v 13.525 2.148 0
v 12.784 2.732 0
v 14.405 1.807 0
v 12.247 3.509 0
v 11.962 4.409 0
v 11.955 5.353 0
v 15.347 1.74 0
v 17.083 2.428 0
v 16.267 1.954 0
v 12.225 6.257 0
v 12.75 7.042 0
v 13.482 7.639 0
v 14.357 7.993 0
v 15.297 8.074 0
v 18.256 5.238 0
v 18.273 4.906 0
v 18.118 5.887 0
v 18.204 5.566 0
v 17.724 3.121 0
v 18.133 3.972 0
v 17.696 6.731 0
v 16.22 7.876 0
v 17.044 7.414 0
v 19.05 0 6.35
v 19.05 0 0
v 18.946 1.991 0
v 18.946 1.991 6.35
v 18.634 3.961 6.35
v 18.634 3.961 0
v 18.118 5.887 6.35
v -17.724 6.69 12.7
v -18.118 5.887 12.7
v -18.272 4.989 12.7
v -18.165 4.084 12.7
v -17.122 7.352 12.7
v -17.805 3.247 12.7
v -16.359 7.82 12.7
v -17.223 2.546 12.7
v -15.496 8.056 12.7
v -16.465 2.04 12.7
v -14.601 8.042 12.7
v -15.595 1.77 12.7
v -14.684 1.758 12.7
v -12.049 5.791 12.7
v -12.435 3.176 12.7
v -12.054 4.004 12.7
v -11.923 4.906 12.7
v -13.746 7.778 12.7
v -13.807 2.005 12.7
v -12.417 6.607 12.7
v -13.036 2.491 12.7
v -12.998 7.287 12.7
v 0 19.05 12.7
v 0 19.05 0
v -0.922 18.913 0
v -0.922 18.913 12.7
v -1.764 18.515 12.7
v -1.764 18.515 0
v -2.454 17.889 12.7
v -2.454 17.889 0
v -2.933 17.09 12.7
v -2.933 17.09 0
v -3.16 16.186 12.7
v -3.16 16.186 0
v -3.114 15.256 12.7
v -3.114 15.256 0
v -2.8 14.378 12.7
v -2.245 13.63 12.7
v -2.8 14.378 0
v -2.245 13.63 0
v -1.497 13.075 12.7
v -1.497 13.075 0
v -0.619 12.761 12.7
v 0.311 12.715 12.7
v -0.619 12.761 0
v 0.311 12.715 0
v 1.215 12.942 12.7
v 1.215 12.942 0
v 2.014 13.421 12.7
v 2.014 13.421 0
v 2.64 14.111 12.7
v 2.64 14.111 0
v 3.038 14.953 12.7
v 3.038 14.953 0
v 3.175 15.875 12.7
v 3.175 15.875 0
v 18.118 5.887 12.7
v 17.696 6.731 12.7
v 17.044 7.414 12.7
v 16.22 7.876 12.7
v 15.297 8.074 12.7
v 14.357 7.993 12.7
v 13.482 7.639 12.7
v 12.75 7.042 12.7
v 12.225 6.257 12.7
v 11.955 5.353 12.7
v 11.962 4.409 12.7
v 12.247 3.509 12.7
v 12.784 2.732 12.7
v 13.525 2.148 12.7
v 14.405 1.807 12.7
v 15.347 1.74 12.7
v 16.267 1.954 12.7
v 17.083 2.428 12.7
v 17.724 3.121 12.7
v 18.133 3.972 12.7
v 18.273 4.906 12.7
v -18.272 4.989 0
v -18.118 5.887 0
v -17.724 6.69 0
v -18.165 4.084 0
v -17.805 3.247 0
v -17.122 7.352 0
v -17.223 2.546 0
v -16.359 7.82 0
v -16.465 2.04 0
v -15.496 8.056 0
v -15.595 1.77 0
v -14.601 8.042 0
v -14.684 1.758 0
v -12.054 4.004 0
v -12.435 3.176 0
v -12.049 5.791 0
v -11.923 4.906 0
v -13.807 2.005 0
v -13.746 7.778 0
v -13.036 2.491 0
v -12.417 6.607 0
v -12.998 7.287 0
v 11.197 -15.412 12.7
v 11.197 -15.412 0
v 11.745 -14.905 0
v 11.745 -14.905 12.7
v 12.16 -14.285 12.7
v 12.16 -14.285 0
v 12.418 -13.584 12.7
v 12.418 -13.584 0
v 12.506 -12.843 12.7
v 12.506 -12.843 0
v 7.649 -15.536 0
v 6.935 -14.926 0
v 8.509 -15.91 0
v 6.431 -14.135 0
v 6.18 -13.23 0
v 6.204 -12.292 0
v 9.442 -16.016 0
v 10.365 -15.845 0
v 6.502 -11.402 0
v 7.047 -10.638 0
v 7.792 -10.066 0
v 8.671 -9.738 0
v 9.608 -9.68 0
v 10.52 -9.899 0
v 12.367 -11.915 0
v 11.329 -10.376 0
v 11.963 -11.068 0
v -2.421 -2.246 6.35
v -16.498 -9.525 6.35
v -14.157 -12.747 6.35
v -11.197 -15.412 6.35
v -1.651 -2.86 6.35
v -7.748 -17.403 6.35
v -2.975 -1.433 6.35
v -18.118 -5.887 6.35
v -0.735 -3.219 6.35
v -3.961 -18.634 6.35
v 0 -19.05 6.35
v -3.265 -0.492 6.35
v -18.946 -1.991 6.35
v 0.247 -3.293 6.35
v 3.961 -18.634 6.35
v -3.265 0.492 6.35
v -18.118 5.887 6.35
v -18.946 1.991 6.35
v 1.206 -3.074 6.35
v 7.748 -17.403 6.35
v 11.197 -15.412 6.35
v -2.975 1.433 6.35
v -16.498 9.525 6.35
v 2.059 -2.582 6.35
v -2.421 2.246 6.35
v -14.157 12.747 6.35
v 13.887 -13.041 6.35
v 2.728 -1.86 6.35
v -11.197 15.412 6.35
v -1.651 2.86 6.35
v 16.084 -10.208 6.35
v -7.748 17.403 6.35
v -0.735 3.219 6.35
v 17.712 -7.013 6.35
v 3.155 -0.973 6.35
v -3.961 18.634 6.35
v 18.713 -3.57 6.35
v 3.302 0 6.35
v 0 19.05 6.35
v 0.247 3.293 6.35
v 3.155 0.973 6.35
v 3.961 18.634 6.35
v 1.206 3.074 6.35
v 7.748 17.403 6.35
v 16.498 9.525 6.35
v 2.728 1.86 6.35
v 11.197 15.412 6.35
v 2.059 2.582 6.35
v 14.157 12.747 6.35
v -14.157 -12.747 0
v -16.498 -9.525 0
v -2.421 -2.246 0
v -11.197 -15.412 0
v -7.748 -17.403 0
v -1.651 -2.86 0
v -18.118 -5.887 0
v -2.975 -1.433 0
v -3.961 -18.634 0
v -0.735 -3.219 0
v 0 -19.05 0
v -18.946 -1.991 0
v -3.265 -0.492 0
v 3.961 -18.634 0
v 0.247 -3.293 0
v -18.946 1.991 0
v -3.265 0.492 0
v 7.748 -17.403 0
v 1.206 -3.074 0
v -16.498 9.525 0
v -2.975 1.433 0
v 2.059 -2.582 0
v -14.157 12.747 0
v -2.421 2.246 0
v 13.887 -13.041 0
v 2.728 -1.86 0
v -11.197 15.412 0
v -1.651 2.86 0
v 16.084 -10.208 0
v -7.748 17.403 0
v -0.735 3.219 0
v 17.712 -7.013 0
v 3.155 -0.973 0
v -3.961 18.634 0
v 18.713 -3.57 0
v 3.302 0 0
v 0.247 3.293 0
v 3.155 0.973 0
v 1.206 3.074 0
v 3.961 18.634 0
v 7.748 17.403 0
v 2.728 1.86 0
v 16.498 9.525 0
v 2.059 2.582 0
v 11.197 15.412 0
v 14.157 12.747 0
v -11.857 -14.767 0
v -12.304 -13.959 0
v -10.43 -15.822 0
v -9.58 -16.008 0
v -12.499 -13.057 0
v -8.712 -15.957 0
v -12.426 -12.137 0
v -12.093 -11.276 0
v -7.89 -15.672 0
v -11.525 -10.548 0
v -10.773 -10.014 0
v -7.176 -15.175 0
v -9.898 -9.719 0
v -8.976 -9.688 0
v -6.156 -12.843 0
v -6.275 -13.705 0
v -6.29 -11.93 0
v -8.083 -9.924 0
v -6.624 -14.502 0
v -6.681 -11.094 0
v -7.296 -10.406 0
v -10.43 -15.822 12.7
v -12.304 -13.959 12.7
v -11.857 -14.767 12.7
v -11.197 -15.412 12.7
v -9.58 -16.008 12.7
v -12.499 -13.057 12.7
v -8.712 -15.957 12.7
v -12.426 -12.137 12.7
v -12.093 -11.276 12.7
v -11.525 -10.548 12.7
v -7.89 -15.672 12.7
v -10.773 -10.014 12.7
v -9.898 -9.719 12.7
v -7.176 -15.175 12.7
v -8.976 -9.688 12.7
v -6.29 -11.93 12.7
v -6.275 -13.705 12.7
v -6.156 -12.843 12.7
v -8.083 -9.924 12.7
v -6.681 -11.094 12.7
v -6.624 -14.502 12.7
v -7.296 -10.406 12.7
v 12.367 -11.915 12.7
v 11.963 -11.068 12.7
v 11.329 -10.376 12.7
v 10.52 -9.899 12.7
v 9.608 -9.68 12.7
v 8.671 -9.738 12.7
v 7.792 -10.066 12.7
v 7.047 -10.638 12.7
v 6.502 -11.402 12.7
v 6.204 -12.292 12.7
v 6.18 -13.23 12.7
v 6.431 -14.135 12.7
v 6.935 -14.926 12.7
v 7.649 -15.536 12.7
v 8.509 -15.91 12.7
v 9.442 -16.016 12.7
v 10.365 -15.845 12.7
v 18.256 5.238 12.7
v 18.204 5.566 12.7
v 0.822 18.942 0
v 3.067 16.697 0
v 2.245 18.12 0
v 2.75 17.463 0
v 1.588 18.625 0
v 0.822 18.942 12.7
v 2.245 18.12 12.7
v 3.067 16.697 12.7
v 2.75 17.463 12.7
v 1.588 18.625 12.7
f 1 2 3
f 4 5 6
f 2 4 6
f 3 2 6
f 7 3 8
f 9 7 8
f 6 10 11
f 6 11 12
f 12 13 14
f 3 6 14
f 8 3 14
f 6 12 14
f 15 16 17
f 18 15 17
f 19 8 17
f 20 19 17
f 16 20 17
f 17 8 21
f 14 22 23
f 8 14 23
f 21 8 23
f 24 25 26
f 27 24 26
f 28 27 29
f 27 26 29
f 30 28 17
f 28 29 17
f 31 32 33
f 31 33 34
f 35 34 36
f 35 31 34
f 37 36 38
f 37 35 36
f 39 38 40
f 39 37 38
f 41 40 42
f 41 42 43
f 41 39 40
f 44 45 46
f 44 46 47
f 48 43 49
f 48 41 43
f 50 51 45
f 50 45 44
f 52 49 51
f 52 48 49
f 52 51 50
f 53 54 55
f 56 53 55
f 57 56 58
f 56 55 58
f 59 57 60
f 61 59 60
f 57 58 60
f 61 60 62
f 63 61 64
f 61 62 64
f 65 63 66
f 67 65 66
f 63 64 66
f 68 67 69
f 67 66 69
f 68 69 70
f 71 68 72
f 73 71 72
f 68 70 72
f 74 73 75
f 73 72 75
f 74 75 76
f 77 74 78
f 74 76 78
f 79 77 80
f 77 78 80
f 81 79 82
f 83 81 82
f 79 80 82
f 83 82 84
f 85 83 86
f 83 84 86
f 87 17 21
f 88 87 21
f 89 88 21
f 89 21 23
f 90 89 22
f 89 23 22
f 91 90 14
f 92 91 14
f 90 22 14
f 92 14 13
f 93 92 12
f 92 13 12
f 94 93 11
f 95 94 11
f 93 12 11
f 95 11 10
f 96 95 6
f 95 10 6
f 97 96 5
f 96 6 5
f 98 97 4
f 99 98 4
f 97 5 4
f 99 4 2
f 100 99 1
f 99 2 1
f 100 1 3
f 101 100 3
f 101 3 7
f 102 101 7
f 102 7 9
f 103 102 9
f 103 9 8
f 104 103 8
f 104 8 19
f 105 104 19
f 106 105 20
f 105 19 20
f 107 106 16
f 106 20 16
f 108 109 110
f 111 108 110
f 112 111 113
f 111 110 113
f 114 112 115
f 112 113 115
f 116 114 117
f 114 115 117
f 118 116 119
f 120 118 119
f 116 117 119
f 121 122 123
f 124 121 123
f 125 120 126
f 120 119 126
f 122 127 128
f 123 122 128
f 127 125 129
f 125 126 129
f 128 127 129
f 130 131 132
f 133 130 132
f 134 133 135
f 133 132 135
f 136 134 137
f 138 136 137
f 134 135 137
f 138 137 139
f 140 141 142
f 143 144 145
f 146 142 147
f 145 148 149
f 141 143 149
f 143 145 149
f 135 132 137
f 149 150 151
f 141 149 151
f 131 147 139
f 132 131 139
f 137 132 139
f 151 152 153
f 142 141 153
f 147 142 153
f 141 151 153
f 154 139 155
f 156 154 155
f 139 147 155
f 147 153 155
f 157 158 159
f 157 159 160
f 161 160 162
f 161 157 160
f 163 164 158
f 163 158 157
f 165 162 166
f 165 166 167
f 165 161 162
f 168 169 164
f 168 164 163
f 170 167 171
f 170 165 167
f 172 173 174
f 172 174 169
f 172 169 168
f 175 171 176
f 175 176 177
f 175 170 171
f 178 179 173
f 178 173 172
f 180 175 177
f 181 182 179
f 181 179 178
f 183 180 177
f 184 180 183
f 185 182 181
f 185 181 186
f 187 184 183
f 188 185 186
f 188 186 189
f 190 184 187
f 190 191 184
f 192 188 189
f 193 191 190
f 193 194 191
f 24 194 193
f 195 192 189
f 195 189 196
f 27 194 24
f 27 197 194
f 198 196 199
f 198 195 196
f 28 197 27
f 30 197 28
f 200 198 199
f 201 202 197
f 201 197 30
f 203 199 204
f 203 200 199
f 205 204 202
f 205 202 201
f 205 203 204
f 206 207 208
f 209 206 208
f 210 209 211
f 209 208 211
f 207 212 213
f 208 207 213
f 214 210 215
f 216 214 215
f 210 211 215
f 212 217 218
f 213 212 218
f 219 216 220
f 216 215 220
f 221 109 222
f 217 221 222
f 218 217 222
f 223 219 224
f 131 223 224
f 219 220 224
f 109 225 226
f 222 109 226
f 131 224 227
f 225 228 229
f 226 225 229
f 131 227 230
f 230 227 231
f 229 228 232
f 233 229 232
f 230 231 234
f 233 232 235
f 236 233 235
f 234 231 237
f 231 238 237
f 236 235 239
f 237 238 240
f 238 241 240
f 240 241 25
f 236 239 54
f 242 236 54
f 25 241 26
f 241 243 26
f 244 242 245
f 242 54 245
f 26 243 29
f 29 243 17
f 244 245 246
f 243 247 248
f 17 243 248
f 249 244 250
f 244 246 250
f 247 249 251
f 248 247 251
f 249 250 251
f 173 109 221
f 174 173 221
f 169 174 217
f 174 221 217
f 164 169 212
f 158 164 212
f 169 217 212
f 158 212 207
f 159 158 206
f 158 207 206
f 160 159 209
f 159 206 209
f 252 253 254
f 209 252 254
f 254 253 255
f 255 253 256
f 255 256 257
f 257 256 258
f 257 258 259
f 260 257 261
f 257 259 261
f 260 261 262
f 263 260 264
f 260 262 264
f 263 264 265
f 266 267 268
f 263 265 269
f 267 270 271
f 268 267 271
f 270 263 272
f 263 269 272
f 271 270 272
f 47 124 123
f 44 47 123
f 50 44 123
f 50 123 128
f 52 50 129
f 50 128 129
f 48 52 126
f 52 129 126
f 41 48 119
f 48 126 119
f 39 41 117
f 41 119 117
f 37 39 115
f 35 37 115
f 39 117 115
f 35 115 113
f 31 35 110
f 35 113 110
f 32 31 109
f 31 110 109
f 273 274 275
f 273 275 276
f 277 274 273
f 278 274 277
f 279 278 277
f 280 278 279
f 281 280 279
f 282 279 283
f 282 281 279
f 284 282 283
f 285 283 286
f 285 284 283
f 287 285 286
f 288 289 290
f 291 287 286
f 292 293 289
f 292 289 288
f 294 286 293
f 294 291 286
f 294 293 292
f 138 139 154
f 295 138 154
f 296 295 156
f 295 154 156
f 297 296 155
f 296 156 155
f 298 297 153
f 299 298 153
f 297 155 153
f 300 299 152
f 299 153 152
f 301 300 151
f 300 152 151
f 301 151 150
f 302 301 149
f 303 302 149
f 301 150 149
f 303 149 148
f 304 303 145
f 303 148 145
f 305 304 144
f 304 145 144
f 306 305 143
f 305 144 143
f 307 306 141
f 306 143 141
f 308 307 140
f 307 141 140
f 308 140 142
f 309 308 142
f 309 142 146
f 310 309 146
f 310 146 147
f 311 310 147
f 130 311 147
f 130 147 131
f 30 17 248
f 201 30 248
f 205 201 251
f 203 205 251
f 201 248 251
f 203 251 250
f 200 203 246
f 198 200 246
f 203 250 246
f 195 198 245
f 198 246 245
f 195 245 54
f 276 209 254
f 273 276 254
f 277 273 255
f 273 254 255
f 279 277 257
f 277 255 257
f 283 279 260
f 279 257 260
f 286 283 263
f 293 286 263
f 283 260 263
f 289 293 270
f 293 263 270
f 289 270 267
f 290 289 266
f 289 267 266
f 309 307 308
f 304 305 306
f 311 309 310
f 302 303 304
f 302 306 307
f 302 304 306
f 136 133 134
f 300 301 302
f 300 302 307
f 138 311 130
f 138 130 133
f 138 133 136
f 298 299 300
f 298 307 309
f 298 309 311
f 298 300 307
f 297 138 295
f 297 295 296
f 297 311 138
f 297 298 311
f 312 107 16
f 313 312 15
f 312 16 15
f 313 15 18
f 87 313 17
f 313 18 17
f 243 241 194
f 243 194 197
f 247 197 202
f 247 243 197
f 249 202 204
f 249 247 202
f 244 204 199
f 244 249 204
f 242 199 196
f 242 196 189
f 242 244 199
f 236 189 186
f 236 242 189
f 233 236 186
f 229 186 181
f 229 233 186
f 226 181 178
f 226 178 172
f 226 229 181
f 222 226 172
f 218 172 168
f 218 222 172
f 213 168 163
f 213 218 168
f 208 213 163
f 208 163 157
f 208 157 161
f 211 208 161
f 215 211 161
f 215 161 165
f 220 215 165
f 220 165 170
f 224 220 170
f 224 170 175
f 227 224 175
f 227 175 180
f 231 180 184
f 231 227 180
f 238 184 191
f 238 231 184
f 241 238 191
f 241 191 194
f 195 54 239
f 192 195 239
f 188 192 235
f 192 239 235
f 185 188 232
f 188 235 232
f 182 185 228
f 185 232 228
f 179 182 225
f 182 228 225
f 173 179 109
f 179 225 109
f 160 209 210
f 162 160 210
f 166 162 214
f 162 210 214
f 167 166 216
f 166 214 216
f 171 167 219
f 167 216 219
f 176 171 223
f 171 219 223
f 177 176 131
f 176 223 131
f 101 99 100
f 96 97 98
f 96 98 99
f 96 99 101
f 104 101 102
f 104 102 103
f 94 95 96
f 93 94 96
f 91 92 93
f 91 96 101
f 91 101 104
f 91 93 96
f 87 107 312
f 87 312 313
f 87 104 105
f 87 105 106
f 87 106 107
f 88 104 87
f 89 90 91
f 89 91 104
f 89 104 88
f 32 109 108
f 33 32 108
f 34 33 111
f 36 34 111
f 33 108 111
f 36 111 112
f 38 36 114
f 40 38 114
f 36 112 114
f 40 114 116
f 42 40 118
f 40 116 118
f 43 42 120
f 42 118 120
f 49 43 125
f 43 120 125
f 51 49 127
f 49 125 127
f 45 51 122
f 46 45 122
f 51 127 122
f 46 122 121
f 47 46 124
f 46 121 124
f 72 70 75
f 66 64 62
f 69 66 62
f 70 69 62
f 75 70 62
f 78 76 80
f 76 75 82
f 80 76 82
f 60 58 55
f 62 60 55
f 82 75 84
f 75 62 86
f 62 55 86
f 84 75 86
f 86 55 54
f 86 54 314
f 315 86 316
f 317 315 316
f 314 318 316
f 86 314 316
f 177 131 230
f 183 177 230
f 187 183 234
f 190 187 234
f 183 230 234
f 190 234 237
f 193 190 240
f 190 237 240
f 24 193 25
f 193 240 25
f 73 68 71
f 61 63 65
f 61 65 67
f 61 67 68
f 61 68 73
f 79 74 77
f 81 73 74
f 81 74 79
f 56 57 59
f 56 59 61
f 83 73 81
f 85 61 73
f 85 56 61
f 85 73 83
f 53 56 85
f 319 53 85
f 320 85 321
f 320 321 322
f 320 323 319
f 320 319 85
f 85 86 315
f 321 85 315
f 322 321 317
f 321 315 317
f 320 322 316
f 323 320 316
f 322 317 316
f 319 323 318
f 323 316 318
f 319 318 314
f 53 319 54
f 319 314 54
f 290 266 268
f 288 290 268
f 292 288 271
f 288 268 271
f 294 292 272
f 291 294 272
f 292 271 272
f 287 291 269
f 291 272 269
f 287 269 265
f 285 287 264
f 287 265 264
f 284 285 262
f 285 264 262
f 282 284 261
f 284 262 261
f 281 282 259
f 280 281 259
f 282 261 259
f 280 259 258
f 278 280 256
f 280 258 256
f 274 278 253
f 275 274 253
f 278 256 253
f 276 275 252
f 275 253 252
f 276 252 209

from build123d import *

# Parameters (mm, degrees)
F0_R     = 3.302
F1_DEPTH = 6.35
F2_DEPTH = 12.7
F3_DEPTH = 12.7


with BuildPart() as f1:
    # F0 (on Top) → F1 (new body)
    with BuildSketch(Plane.XY):
        with BuildLine():
            ThreePointArc((11.19730897, -15.4117738054), (16.9736742616, -8.6485190675), (19.05, 0))
            ThreePointArc((19.05, 0), (18.8154628823, 2.980076597), (18.1176266116, 5.8867738161))
            ThreePointArc((18.1176266116, 5.8867738161), (11.197309025, 15.4117737655), (0, 19.05))
            ThreePointArc((0, 19.05), (-11.1973090383, 15.4117737558), (-18.1176266218, 5.8867737848))
            ThreePointArc((-18.1176266218, 5.8867737848), (-18.1176266522, -5.8867736914), (-11.1973091081, -15.4117737051))
            ThreePointArc((-11.1973091081, -15.4117737051), (-8.53e-08, -19.05), (11.19730897, -15.4117738054))
        make_face()
        with BuildLine():
            ThreePointArc((-6.1560908801, -12.8431447857), (-7.8896710721, -15.6720905146), (-11.1973091081, -15.4117737051))
            ThreePointArc((-11.1973091081, -15.4117737051), (-10.7725106882, -10.0141990568), (-6.1560908801, -12.8431447857))
        make_face(mode=Mode.SUBTRACT)
        with BuildLine():
            ThreePointArc((12.5060908801, -12.8431447857), (12.1600365703, -14.2845646698), (11.19730897, -15.4117738054))
            ThreePointArc((11.19730897, -15.4117738054), (6.50214519, -11.4017249016), (12.5060908801, -12.8431447857))
        make_face(mode=Mode.SUBTRACT)
        with BuildLine():
            ThreePointArc((-11.9230221962, 4.9056447857), (-15.5947016445, 1.7697343078), (-18.1176266218, 5.8867737848))
            ThreePointArc((-18.1176266218, 5.8867737848), (-14.6013427479, 8.0415552636), (-11.9230221962, 4.9056447857))
        make_face(mode=Mode.SUBTRACT)
        Circle(F0_R, mode=Mode.SUBTRACT)
        with BuildLine():
            ThreePointArc((18.2730221962, 4.9056447857), (11.9621117208, 4.4089653212), (18.1176266116, 5.8867738161))
            ThreePointArc((18.1176266116, 5.8867738161), (18.2339326716, 5.4023242502), (18.2730221962, 4.9056447857))
        make_face(mode=Mode.SUBTRACT)
        with BuildLine():
            ThreePointArc((3.175, 15.875), (-2.2450640303, 13.6299359697), (0, 19.05))
            ThreePointArc((0, 19.05), (2.2450640303, 18.1200640303), (3.175, 15.875))
        make_face(mode=Mode.SUBTRACT)
        with BuildLine():
            ThreePointArc((18.2730221962, 4.9056447857), (18.2339326716, 5.4023242502), (18.1176266116, 5.8867738161))
            ThreePointArc((18.1176266116, 5.8867738161), (11.9621117208, 4.4089653212), (18.2730221962, 4.9056447857))
        make_face()
        with BuildLine():
            ThreePointArc((3.175, 15.875), (2.2450640303, 18.1200640303), (0, 19.05))
            ThreePointArc((0, 19.05), (-2.2450640303, 13.6299359697), (3.175, 15.875))
        make_face()
        with BuildLine():
            ThreePointArc((-11.9230221962, 4.9056447857), (-14.6013427479, 8.0415552636), (-18.1176266218, 5.8867737848))
            ThreePointArc((-18.1176266218, 5.8867737848), (-15.5947016445, 1.7697343078), (-11.9230221962, 4.9056447857))
        make_face()
        with BuildLine():
            ThreePointArc((-6.1560908801, -12.8431447857), (-10.7725106882, -10.0141990568), (-11.1973091081, -15.4117737051))
            ThreePointArc((-11.1973091081, -15.4117737051), (-7.8896710721, -15.6720905146), (-6.1560908801, -12.8431447857))
        make_face()
        with BuildLine():
            ThreePointArc((12.5060908801, -12.8431447857), (6.50214519, -11.4017249016), (11.19730897, -15.4117738054))
            ThreePointArc((11.19730897, -15.4117738054), (12.1600365703, -14.2845646698), (12.5060908801, -12.8431447857))
        make_face()
    extrude(amount=F1_DEPTH)


with BuildPart() as f2:
    # F0 (on Top) → F2 (new body)
    with BuildSketch(Plane.XY):
        with BuildLine():
            ThreePointArc((3.175, 15.875), (2.2450640303, 18.1200640303), (0, 19.05))
            ThreePointArc((0, 19.05), (-2.2450640303, 13.6299359697), (3.175, 15.875))
        make_face()
    extrude(amount=F2_DEPTH)


with BuildPart() as f2b:
    # F0 (on Top) → F2, piece 2 (new body)
    with BuildSketch(Plane.XY):
        with BuildLine():
            ThreePointArc((-6.1560908801, -12.8431447857), (-10.7725106882, -10.0141990568), (-11.1973091081, -15.4117737051))
            ThreePointArc((-11.1973091081, -15.4117737051), (-7.8896710721, -15.6720905146), (-6.1560908801, -12.8431447857))
        make_face()
    extrude(amount=F2_DEPTH)


with BuildPart() as f2c:
    # F0 (on Top) → F2, piece 3 (new body)
    with BuildSketch(Plane.XY):
        with BuildLine():
            ThreePointArc((12.5060908801, -12.8431447857), (6.50214519, -11.4017249016), (11.19730897, -15.4117738054))
            ThreePointArc((11.19730897, -15.4117738054), (12.1600365703, -14.2845646698), (12.5060908801, -12.8431447857))
        make_face()
    extrude(amount=F2_DEPTH)


with BuildPart() as f2d:
    # F0 (on Top) → F2, piece 4 (new body)
    with BuildSketch(Plane.XY):
        with BuildLine():
            ThreePointArc((18.2730221962, 4.9056447857), (18.2339326716, 5.4023242502), (18.1176266116, 5.8867738161))
            ThreePointArc((18.1176266116, 5.8867738161), (11.9621117208, 4.4089653212), (18.2730221962, 4.9056447857))
        make_face()
    extrude(amount=F2_DEPTH)


with BuildPart() as f3:
    # F0 (on Top) → F3 (new body)
    with BuildSketch(Plane.XY):
        with BuildLine():
            ThreePointArc((-11.9230221962, 4.9056447857), (-14.6013427479, 8.0415552636), (-18.1176266218, 5.8867737848))
            ThreePointArc((-18.1176266218, 5.8867737848), (-15.5947016445, 1.7697343078), (-11.9230221962, 4.9056447857))
        make_face()
    extrude(amount=F3_DEPTH)


solid = Compound([f1.part, f2.part, f2b.part, f2c.part, f2d.part, f3.part])
